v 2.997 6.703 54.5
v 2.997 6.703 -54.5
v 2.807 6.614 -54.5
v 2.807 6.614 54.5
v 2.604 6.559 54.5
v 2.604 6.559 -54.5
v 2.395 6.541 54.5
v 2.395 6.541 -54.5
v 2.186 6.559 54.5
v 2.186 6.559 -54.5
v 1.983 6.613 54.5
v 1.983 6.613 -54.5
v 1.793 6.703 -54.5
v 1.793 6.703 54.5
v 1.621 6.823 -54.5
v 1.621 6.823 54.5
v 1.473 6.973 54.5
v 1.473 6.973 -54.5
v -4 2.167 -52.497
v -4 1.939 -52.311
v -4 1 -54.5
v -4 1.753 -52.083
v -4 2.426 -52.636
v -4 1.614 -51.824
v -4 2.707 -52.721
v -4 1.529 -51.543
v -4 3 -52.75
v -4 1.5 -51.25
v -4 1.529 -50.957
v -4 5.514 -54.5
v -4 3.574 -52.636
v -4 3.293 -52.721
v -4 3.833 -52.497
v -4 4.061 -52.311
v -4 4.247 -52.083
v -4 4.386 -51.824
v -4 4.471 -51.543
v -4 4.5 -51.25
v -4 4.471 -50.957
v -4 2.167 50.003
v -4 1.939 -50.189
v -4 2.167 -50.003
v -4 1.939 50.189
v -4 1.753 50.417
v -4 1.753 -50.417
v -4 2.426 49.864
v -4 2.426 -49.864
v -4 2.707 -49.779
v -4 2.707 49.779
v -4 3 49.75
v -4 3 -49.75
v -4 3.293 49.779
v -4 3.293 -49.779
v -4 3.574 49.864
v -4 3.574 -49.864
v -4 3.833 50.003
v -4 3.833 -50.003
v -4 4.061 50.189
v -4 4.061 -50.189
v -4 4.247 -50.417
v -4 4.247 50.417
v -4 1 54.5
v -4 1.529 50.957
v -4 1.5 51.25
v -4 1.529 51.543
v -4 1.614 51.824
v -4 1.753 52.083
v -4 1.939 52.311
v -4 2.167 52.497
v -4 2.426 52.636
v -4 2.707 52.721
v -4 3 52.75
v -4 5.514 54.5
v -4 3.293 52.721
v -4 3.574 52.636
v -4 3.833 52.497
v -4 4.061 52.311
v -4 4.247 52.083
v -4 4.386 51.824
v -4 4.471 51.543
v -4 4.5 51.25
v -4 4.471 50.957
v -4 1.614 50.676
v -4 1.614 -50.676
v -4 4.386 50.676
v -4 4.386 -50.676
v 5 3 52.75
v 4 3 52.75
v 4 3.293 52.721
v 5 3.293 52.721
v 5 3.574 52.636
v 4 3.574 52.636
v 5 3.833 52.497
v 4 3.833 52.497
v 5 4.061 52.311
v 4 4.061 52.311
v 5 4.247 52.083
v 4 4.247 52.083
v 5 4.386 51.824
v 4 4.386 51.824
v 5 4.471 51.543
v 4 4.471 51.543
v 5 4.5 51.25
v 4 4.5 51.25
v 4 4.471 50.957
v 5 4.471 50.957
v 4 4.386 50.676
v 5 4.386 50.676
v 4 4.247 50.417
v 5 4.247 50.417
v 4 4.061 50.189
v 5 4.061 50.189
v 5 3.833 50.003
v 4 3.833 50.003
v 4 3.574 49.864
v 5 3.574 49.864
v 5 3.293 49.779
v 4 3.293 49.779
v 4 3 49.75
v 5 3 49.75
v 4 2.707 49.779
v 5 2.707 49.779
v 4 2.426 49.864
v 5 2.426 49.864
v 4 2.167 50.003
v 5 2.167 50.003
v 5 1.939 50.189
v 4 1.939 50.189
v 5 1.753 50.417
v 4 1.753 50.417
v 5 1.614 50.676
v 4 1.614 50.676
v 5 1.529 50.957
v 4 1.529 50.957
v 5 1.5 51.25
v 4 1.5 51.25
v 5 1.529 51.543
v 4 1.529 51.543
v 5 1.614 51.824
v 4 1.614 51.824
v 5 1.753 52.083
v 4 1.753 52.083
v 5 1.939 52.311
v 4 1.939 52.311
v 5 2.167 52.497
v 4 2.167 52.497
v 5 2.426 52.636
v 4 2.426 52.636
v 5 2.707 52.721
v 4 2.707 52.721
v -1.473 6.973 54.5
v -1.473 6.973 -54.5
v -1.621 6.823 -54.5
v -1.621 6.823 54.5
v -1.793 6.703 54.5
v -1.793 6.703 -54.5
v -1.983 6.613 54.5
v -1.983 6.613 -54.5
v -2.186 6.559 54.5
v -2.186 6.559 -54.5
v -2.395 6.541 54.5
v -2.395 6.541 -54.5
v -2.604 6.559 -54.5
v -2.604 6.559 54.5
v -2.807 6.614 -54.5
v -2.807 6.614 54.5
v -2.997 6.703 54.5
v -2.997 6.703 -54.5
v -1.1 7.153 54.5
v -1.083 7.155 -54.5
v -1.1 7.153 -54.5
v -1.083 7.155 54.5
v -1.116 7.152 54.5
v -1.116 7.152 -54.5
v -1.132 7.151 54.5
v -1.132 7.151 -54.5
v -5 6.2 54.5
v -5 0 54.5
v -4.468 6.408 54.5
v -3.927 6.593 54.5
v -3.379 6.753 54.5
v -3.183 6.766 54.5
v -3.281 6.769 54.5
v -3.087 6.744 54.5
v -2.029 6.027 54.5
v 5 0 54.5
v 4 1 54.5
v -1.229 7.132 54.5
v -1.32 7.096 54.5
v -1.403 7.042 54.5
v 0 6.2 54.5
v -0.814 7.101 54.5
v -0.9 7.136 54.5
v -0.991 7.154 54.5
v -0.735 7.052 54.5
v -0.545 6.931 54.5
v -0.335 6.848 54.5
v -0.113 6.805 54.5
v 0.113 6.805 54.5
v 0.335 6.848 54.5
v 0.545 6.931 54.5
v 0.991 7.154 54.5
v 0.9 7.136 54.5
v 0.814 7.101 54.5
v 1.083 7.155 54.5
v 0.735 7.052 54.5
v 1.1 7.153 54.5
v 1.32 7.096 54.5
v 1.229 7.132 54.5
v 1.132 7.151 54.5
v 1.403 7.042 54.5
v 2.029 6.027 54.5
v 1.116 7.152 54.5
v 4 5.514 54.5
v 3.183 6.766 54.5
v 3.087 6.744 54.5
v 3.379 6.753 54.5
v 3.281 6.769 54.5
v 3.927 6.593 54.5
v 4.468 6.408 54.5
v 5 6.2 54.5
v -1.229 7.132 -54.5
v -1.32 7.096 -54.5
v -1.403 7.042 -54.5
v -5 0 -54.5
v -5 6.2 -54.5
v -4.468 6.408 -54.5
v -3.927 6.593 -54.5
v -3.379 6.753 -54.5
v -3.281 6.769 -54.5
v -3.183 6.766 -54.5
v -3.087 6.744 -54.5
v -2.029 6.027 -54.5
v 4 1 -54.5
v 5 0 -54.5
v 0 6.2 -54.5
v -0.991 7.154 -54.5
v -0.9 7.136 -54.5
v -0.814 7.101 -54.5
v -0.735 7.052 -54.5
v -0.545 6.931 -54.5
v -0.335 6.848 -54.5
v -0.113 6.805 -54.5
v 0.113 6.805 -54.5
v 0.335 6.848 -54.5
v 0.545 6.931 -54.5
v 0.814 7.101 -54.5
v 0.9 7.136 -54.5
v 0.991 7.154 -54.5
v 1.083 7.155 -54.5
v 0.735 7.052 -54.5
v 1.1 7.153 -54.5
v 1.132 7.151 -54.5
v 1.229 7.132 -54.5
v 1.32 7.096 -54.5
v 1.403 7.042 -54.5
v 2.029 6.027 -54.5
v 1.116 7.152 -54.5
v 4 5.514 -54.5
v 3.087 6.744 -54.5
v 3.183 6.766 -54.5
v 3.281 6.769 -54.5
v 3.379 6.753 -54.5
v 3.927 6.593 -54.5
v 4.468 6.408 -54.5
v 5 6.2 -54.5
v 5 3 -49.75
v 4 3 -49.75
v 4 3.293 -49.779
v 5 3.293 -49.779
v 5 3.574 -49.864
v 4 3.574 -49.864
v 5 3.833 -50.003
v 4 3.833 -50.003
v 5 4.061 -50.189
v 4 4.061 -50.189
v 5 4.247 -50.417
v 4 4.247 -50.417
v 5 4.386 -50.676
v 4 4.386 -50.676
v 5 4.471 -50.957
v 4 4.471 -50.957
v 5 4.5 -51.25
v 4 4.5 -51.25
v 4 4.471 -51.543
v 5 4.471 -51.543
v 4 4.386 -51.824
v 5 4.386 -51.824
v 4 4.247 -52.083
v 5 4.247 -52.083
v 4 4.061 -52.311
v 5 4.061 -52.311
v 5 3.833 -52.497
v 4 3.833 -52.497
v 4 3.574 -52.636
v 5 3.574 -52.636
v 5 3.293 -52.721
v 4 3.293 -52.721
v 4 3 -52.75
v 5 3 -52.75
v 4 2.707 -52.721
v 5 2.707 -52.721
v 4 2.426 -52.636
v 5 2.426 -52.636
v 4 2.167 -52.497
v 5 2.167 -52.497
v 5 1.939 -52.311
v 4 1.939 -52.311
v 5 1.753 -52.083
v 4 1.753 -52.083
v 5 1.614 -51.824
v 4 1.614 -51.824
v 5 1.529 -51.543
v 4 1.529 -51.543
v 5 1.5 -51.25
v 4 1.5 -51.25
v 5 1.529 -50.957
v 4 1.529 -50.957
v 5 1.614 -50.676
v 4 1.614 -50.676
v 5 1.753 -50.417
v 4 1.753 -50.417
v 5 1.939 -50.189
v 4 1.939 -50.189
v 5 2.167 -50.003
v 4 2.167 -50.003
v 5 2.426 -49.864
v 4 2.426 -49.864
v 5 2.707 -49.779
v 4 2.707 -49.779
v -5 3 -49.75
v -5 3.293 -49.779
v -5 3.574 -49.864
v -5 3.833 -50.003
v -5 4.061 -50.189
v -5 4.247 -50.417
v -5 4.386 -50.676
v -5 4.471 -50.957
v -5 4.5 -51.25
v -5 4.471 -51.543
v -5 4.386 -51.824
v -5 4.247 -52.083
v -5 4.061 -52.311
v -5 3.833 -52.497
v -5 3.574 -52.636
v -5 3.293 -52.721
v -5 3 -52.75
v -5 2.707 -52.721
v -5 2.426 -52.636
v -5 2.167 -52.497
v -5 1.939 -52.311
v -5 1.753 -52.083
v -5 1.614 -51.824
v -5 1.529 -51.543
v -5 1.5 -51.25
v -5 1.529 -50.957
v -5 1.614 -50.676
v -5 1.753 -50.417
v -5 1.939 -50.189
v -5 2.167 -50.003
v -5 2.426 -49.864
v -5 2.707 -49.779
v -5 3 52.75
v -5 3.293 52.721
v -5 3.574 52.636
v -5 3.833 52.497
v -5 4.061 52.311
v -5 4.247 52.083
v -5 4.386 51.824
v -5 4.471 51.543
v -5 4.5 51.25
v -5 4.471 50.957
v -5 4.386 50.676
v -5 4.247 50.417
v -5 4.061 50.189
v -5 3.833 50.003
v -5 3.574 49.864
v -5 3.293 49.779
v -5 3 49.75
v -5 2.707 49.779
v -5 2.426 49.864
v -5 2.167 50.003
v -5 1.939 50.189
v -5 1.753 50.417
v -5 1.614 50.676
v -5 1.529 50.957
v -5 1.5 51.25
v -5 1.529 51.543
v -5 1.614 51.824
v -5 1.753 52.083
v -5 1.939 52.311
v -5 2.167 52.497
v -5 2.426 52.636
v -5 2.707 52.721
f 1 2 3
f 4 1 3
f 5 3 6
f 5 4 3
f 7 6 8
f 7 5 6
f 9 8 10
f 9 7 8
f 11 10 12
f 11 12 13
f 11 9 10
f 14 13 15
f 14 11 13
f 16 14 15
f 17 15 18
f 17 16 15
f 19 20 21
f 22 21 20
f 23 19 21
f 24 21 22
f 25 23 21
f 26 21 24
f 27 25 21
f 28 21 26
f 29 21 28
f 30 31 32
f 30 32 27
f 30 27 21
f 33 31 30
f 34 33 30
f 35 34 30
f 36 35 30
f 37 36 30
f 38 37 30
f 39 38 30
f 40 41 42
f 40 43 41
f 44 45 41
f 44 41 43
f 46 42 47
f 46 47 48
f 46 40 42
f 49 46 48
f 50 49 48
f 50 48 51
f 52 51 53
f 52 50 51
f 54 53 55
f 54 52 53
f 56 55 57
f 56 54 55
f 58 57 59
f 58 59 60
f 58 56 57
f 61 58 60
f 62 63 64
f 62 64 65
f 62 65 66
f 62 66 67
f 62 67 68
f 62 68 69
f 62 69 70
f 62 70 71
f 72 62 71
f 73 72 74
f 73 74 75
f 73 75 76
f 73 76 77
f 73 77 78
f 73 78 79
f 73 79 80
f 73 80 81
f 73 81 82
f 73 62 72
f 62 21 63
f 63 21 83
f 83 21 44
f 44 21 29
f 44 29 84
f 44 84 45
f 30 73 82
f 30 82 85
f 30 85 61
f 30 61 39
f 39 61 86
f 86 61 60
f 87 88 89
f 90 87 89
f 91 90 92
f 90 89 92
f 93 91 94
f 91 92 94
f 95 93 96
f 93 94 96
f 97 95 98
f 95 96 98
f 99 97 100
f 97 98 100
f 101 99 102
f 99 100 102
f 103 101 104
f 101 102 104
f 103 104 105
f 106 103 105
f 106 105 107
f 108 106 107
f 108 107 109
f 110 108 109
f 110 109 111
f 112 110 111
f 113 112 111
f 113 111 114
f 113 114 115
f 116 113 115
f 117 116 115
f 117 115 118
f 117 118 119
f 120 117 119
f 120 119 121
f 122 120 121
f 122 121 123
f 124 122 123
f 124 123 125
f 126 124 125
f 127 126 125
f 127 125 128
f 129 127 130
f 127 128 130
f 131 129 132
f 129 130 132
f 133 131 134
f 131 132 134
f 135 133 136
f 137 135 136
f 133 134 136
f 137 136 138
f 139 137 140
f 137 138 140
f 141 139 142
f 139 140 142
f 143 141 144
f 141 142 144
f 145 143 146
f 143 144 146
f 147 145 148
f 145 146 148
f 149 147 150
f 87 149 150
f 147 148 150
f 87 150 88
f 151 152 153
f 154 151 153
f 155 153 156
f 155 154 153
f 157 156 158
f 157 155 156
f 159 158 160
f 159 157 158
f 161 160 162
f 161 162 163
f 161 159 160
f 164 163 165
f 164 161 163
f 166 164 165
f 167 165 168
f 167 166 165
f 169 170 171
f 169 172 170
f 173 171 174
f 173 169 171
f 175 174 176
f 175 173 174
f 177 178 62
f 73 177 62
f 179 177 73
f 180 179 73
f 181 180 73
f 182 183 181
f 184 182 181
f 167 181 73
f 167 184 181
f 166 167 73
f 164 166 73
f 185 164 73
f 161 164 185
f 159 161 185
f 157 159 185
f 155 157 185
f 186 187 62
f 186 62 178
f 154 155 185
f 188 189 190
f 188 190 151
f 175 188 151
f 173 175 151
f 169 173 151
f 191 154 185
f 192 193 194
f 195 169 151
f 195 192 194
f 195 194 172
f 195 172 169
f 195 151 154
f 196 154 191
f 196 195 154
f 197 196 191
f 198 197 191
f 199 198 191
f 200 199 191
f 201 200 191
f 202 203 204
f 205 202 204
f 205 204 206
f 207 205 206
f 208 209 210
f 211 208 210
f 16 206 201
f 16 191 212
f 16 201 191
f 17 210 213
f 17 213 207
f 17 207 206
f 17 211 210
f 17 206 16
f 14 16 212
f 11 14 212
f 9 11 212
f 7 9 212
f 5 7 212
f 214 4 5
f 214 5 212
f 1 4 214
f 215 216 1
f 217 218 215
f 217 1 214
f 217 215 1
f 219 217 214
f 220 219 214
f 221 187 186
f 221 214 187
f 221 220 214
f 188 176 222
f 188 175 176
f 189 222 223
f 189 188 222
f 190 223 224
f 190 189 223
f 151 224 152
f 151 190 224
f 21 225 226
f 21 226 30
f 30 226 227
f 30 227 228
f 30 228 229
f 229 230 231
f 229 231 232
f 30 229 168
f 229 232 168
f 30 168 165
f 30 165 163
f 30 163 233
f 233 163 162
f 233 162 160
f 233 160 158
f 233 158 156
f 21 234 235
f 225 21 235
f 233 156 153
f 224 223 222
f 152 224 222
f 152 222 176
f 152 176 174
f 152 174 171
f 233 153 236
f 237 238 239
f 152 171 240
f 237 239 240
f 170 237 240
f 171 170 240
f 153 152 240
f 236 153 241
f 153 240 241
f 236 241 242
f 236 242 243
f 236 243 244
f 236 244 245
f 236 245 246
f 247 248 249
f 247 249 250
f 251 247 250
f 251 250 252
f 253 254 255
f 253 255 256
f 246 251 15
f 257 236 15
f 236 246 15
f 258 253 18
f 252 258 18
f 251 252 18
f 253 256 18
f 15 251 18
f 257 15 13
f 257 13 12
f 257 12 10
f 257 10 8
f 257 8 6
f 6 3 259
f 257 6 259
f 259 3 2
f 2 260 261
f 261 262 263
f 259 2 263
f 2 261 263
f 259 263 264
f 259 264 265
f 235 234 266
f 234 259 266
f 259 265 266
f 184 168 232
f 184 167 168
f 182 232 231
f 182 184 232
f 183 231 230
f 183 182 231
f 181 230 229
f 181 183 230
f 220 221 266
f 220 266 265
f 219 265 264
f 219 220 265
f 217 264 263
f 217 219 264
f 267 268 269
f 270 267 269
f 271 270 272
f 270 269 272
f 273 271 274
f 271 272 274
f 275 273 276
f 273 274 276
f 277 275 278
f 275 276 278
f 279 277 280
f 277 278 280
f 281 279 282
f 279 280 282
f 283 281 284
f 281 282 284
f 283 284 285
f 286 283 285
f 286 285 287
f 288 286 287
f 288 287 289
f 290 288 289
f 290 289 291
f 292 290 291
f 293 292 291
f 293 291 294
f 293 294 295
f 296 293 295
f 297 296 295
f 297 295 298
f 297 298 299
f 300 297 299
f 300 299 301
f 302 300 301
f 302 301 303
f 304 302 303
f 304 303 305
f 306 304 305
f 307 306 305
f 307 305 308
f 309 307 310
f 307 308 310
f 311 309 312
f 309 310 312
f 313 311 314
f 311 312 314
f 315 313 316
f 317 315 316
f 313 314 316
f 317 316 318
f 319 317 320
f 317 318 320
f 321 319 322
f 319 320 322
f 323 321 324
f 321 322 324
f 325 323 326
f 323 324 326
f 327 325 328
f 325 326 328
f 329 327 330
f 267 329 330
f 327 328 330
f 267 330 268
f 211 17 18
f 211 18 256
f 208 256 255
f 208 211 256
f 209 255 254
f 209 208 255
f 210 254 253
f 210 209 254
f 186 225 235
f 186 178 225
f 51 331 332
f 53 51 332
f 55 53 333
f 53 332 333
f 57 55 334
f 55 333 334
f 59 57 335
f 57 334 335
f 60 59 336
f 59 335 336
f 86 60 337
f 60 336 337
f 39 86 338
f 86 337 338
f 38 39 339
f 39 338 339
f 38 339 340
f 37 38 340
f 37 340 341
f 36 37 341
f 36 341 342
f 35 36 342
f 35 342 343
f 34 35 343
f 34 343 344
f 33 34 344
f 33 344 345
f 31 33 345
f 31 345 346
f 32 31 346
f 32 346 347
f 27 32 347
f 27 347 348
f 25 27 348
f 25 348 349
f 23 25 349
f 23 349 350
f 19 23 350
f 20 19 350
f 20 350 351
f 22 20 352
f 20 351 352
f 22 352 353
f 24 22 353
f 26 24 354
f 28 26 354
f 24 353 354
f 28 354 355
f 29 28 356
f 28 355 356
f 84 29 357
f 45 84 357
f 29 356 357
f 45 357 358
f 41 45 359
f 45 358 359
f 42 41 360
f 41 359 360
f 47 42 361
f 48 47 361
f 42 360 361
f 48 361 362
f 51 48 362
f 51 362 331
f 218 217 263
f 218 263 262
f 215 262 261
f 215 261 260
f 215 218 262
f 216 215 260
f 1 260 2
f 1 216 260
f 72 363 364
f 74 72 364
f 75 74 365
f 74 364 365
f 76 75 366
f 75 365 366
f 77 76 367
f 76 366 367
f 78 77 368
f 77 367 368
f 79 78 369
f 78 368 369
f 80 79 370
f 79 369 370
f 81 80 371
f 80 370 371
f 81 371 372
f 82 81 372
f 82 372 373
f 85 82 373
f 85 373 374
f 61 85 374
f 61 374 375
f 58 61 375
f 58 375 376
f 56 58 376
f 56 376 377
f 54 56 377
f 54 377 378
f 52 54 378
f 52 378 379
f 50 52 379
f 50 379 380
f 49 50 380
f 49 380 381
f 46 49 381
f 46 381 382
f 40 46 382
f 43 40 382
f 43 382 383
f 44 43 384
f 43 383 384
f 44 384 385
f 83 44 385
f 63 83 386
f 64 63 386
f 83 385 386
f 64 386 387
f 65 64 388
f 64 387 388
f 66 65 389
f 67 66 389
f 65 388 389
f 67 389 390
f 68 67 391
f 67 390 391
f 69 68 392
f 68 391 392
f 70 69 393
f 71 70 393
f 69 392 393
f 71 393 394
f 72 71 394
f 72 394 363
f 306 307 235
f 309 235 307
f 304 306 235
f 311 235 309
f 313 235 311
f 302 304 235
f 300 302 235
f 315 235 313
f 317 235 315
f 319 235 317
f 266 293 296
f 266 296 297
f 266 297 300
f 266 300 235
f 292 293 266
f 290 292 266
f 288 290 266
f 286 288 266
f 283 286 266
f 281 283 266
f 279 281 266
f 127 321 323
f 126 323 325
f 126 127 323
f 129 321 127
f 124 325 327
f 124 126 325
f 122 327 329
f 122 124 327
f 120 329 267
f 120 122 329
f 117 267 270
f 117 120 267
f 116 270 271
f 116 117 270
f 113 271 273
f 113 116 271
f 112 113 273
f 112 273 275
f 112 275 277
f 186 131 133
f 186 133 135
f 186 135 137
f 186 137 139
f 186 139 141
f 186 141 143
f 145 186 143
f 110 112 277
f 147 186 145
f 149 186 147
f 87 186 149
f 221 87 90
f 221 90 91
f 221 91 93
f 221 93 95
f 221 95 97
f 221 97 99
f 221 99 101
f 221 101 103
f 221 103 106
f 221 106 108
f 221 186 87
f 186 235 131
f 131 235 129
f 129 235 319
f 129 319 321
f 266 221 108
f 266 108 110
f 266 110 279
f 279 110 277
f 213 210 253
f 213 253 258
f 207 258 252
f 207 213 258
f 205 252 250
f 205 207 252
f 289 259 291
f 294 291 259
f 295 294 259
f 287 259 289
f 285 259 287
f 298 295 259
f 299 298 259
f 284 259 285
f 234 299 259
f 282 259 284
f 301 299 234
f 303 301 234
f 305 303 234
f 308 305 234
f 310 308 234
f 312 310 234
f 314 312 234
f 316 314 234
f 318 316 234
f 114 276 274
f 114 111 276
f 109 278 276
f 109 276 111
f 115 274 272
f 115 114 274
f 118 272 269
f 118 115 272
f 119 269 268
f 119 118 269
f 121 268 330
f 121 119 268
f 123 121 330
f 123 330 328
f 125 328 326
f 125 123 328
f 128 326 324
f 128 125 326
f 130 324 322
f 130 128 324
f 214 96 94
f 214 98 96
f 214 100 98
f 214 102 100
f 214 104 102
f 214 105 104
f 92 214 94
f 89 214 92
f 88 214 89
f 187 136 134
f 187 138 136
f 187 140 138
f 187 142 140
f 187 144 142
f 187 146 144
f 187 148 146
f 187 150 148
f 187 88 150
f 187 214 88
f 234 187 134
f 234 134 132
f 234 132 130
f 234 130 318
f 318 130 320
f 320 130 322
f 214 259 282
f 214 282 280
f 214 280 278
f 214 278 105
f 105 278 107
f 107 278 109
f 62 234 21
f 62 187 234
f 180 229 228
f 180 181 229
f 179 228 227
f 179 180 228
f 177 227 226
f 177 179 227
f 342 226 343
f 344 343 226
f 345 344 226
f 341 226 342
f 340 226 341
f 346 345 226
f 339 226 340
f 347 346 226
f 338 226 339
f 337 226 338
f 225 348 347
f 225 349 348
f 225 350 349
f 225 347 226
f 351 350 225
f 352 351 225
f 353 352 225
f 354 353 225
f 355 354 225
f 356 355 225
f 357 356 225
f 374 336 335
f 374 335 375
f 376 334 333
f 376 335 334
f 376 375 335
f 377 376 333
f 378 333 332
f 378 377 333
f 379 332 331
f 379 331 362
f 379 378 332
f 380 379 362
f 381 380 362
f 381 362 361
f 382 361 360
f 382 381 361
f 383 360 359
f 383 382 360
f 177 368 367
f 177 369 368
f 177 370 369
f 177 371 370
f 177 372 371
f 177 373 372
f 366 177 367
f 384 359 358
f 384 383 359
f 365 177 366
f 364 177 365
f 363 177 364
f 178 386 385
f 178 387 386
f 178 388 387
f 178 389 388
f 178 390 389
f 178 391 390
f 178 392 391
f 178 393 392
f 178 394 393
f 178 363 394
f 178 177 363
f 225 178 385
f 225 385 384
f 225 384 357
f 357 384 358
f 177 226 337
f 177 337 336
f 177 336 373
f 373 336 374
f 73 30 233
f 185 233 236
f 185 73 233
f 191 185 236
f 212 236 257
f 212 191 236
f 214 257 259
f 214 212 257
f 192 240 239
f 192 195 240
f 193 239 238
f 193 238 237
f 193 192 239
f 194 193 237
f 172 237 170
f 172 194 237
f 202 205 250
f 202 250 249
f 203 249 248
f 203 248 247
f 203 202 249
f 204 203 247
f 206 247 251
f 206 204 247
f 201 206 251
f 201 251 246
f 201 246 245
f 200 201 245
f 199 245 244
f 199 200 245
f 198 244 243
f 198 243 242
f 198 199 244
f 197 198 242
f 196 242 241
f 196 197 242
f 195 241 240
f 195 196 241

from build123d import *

# Parameters (mm, degrees)
BOSS_EXTRU_1_DEPTH      = 54.5
ESQUISSE2_R             = 1.5
ENL_V_MAT_EXTRU_1_DEPTH = 56.87007968


with BuildPart() as part:
    # Esquisse1 → Boss.-Extru.1 (new, symmetric)
    with BuildSketch(Plane.XY):
        with BuildLine():
            Line((-5, 0), (5, 0))
            Line((5, 0), (5, 6.2))
            ThreePointArc((5, 6.2), (4.198380709, 6.503397881), (3.378511037, 6.753312837))
            ThreePointArc((3.378511037, 6.753312837), (3.182940128, 6.766167342), (2.997453176, 6.702860077))
            ThreePointArc((2.997453176, 6.702860077), (2.185788495, 6.558879309), (1.472744558, 6.972519685))
            ThreePointArc((1.472744558, 6.972519685), (1.320223309, 7.095607002), (1.132107007, 7.150611326))
            ThreePointArc((1.132107007, 7.150611326), (1.107721314, 7.152719926), (1.083331695, 7.154782609))
            ThreePointArc((1.083331695, 7.154782609), (0.899623928, 7.135921685), (0.735293006, 7.051662404))
            ThreePointArc((0.735293006, 7.051662404), (0, 6.8), (-0.735293006, 7.051662404))
            ThreePointArc((-0.735293006, 7.051662404), (-0.899623928, 7.135921685), (-1.083331695, 7.154782609))
            ThreePointArc((-1.083331695, 7.154782609), (-1.107721314, 7.152719926), (-1.132107007, 7.150611326))
            ThreePointArc((-1.132107007, 7.150611326), (-1.320223309, 7.095607002), (-1.472744558, 6.972519685))
            ThreePointArc((-1.472744558, 6.972519685), (-2.185788495, 6.558879309), (-2.997453176, 6.702860077))
            ThreePointArc((-2.997453176, 6.702860077), (-3.182940128, 6.766167342), (-3.378511037, 6.753312837))
            ThreePointArc((-3.378511037, 6.753312837), (-4.198380709, 6.503397881), (-5, 6.2))
            Line((-5, 6.2), (-5, 0))
        make_face()
        with BuildLine():
            Line((-4, 1), (-4, 5.513708499))
            ThreePointArc((-4, 5.513708499), (0, 6.2), (4, 5.513708499))
            Line((4, 5.513708499), (4, 1))
            Line((4, 1), (-4, 1))
        make_face(mode=Mode.SUBTRACT)
    extrude(amount=BOSS_EXTRU_1_DEPTH, both=True)

    # Esquisse2 → Enlèv. mat.-Extru.1 (cut, through all)
    with BuildSketch(Plane.ZY.offset(5)):
        with Locations((-51.25, 3)):
            Circle(ESQUISSE2_R)
        with Locations((51.25, 3)):
            Circle(ESQUISSE2_R)
    extrude(amount=-ENL_V_MAT_EXTRU_1_DEPTH, mode=Mode.SUBTRACT)


solid = part.part
